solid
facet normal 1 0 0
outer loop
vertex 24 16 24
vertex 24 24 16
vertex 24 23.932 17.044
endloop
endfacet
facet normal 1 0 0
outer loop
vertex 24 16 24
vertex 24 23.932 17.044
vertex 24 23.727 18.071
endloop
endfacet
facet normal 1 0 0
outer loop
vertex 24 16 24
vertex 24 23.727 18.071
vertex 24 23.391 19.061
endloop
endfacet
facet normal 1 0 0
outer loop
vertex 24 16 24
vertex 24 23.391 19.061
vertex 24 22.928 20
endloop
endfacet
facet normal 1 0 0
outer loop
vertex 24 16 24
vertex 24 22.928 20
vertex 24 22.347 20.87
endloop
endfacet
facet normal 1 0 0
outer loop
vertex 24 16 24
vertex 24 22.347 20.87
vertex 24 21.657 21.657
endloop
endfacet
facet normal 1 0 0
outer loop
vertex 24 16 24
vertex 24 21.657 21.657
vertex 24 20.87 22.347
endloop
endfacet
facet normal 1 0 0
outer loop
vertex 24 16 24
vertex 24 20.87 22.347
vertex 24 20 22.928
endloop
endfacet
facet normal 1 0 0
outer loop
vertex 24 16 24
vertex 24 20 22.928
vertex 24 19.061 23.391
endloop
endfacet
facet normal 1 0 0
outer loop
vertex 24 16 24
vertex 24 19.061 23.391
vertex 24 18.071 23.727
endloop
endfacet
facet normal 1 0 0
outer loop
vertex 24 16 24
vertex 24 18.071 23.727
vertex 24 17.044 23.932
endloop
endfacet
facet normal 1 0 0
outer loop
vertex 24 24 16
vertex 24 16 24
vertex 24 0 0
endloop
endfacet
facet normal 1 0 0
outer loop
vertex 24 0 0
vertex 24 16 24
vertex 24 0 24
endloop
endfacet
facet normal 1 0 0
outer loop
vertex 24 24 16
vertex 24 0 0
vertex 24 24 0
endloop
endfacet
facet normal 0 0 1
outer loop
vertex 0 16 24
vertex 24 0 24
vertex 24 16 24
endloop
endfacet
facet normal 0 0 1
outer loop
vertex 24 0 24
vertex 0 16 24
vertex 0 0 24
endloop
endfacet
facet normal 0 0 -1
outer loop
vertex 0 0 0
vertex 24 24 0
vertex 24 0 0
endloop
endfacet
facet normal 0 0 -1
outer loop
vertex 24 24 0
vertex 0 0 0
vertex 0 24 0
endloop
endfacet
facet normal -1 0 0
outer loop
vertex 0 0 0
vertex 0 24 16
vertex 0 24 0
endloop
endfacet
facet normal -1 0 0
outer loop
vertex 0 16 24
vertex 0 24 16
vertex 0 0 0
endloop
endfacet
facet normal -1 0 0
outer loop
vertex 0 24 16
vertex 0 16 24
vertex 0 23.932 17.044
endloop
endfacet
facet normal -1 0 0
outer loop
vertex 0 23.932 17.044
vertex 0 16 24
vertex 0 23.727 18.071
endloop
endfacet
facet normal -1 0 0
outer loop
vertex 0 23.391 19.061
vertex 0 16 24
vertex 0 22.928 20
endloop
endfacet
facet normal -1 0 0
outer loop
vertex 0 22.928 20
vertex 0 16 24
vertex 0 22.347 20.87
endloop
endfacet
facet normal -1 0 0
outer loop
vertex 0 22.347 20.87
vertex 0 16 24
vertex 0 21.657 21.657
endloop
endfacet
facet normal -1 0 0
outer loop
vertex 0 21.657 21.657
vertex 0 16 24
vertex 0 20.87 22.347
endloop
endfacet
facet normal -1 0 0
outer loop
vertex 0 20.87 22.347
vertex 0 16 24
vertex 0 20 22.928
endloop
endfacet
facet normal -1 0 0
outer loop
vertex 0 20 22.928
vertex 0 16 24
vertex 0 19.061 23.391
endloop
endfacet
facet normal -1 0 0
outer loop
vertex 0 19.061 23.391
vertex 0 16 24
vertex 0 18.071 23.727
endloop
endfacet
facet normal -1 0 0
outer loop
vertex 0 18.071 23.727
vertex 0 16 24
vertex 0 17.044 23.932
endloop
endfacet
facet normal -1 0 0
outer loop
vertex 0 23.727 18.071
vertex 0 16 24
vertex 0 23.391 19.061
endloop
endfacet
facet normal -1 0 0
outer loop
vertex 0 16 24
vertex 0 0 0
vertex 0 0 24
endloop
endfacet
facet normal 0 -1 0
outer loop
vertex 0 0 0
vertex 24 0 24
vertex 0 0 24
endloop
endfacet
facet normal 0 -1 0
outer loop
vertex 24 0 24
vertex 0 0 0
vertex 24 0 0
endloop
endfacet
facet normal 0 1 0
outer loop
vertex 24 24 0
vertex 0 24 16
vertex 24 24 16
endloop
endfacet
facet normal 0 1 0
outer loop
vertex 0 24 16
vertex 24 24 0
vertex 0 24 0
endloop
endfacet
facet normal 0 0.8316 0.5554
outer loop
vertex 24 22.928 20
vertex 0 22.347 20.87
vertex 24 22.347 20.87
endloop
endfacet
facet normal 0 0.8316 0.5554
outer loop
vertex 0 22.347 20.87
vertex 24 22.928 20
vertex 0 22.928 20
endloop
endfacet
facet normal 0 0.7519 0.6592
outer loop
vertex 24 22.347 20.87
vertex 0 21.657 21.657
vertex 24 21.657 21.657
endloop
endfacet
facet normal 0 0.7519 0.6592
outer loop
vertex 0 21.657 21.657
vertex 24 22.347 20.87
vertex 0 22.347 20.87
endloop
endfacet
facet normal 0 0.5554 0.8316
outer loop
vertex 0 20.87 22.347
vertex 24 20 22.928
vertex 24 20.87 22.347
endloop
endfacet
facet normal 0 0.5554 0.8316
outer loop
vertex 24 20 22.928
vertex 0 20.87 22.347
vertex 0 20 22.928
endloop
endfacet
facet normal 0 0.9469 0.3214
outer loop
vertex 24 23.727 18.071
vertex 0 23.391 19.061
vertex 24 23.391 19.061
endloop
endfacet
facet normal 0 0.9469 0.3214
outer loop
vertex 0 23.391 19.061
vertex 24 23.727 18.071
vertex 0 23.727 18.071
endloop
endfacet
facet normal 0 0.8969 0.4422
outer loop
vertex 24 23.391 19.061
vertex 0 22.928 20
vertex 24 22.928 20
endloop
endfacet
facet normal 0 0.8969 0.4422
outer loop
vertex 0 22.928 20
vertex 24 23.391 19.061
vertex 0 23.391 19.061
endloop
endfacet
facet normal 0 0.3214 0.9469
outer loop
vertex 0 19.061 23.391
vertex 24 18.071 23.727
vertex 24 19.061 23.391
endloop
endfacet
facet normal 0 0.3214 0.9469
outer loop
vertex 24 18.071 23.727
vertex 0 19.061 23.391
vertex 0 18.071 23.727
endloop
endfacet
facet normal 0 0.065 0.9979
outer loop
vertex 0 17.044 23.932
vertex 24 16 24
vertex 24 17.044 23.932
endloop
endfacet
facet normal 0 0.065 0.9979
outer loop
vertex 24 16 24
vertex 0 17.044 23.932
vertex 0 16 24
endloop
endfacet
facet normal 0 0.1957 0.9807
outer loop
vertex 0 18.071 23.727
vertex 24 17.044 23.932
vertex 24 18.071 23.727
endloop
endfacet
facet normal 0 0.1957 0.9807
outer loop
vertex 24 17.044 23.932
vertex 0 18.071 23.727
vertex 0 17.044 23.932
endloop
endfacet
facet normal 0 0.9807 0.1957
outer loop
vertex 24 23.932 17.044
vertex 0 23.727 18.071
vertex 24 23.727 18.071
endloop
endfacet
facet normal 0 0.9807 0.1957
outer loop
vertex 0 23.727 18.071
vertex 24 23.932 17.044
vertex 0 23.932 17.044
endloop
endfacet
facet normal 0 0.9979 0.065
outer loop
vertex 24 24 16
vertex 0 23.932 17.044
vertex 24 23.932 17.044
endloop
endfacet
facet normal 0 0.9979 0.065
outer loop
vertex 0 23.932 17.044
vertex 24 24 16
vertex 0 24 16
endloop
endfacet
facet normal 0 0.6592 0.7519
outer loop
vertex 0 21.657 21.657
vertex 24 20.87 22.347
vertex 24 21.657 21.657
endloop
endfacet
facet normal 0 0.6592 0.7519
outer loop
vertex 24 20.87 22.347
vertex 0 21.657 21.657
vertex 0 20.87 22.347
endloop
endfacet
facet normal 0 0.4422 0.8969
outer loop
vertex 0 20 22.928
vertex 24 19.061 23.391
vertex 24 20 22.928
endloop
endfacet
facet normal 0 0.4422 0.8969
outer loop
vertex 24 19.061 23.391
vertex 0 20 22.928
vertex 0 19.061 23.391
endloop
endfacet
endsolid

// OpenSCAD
// Fillet: a curved (radiused) transition replacing one edge of a block.
$fn = 48;
sx = 24; sy = 24; sz = 24;
r  = 8; // fillet radius

union() {
    // main block minus the rounded corner strip
    cube([sx, sy - r, sz]);
    translate([0, sy - r, 0]) cube([sx, r, sz - r]);
    // rounded corner strip along the same top-back edge chamfer.scad cuts
    translate([0, sy - r, sz - r])
    rotate([0, 90, 0])
    cylinder(h = sx, r = r);
}
